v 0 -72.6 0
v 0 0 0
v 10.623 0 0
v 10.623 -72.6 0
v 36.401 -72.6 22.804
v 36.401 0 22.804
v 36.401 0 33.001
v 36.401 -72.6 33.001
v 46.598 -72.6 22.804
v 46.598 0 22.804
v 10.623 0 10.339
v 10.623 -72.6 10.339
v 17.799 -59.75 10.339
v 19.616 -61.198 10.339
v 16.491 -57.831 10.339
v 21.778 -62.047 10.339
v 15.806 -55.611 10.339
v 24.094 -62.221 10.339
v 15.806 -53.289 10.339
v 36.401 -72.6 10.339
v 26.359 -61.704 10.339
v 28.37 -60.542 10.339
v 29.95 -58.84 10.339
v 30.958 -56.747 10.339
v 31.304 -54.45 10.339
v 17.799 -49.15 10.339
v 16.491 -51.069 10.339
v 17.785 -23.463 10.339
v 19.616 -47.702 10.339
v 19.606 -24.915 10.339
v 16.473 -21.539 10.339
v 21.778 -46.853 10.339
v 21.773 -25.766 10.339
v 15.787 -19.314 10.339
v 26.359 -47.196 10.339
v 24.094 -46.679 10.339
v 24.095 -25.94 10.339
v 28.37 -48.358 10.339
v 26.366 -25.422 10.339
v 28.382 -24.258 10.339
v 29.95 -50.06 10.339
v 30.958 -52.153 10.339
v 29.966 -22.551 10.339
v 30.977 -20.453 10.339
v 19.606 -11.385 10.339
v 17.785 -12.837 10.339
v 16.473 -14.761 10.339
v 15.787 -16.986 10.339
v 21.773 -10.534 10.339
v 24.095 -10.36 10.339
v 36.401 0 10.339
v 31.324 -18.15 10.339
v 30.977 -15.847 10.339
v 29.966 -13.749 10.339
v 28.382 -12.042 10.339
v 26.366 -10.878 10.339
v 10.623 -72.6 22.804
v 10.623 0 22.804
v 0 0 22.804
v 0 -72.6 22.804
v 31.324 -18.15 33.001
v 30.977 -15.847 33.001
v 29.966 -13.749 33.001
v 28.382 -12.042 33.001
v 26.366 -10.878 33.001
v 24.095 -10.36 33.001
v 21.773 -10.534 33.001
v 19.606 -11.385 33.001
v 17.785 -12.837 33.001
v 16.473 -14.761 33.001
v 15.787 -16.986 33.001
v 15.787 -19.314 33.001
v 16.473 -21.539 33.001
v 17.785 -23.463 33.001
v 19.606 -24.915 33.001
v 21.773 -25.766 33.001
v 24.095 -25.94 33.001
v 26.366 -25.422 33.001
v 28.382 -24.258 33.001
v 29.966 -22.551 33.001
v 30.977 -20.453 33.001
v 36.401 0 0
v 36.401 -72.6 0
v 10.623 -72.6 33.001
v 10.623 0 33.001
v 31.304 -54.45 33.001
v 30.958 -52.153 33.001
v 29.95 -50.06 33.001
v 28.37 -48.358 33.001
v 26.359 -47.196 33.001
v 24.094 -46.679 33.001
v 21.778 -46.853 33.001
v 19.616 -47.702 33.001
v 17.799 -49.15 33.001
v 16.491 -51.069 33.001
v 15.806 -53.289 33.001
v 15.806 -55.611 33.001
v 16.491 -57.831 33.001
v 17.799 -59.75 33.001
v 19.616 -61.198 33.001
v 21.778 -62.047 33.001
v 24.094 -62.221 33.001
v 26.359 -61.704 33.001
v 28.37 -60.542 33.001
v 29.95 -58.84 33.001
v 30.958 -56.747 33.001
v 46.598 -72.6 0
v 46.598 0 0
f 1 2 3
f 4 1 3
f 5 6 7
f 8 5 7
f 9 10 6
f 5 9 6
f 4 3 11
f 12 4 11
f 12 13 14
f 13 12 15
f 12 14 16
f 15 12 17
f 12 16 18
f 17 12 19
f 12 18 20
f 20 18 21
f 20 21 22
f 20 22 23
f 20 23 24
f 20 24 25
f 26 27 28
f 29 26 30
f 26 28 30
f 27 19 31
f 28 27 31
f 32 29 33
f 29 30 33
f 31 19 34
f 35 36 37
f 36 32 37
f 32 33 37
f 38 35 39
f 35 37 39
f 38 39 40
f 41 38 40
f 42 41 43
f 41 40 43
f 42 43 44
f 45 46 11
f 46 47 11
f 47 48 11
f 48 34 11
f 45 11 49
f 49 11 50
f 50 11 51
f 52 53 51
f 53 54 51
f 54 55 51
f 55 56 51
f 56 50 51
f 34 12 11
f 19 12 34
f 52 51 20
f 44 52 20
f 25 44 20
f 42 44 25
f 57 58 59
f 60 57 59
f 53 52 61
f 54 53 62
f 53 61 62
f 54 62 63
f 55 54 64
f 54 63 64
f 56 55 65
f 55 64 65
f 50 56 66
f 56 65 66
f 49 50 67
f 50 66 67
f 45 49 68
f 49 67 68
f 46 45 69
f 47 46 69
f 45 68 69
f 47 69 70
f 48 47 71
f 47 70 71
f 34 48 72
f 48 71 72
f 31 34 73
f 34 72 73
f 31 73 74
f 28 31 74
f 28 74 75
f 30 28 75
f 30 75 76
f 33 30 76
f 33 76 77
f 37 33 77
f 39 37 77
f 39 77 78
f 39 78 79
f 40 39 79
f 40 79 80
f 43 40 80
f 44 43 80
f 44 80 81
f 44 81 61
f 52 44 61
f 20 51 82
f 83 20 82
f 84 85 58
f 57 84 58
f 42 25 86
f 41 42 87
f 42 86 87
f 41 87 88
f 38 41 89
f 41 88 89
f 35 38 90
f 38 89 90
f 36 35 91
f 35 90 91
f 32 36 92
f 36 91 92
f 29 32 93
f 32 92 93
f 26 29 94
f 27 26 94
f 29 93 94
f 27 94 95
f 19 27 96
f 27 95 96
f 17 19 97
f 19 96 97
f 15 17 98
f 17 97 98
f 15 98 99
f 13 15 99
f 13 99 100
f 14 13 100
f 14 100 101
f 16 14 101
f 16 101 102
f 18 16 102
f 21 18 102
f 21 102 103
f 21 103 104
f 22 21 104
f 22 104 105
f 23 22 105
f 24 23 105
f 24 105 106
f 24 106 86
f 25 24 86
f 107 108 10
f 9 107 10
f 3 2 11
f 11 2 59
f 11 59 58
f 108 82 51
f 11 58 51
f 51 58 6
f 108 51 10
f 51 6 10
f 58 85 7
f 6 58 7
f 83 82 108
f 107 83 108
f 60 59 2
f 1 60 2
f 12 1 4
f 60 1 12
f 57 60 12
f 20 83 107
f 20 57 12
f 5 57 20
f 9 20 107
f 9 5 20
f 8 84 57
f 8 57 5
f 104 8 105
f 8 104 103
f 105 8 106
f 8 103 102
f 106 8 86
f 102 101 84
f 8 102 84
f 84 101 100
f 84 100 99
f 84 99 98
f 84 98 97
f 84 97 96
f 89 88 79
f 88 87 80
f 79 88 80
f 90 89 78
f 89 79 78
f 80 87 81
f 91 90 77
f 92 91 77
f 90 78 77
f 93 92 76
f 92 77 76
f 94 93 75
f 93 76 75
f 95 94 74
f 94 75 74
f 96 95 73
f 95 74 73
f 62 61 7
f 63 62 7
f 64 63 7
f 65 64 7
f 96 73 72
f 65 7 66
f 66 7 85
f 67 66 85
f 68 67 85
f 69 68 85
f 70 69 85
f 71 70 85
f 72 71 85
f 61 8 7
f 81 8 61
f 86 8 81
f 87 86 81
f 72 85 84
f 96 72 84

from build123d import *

# Parameters (mm, degrees)
F1_DEPTH = 72.6
F2_R     = 7.811886
F2_R_2   = 7.792349
F3_DEPTH = 25


with BuildPart() as f1:
    # F0 (on Front) → F1 (new body)
    with BuildSketch(Plane.XZ):
        Polygon((0, 22.803508), (0, 0), (10.622752, 0), (10.622752, 10.339479), (36.400631, 10.339479), (36.400631, 0), (46.598472, 0), (46.598472, 22.803508), (36.400631, 22.803508), (36.400631, 33.001352), (10.622752, 33.001352), (10.622752, 22.803508), align=None)
    extrude(amount=F1_DEPTH)

    # F2 (on face) → F3 (cut)
    with BuildSketch(Plane.XY.offset(33.001352)):
        with Locations((23.511691, -18.15)):
            Circle(F2_R)
        with Locations((23.511691, -54.45)):
            Circle(F2_R_2)
    extrude(amount=-F3_DEPTH, mode=Mode.SUBTRACT)


solid = f1.part
